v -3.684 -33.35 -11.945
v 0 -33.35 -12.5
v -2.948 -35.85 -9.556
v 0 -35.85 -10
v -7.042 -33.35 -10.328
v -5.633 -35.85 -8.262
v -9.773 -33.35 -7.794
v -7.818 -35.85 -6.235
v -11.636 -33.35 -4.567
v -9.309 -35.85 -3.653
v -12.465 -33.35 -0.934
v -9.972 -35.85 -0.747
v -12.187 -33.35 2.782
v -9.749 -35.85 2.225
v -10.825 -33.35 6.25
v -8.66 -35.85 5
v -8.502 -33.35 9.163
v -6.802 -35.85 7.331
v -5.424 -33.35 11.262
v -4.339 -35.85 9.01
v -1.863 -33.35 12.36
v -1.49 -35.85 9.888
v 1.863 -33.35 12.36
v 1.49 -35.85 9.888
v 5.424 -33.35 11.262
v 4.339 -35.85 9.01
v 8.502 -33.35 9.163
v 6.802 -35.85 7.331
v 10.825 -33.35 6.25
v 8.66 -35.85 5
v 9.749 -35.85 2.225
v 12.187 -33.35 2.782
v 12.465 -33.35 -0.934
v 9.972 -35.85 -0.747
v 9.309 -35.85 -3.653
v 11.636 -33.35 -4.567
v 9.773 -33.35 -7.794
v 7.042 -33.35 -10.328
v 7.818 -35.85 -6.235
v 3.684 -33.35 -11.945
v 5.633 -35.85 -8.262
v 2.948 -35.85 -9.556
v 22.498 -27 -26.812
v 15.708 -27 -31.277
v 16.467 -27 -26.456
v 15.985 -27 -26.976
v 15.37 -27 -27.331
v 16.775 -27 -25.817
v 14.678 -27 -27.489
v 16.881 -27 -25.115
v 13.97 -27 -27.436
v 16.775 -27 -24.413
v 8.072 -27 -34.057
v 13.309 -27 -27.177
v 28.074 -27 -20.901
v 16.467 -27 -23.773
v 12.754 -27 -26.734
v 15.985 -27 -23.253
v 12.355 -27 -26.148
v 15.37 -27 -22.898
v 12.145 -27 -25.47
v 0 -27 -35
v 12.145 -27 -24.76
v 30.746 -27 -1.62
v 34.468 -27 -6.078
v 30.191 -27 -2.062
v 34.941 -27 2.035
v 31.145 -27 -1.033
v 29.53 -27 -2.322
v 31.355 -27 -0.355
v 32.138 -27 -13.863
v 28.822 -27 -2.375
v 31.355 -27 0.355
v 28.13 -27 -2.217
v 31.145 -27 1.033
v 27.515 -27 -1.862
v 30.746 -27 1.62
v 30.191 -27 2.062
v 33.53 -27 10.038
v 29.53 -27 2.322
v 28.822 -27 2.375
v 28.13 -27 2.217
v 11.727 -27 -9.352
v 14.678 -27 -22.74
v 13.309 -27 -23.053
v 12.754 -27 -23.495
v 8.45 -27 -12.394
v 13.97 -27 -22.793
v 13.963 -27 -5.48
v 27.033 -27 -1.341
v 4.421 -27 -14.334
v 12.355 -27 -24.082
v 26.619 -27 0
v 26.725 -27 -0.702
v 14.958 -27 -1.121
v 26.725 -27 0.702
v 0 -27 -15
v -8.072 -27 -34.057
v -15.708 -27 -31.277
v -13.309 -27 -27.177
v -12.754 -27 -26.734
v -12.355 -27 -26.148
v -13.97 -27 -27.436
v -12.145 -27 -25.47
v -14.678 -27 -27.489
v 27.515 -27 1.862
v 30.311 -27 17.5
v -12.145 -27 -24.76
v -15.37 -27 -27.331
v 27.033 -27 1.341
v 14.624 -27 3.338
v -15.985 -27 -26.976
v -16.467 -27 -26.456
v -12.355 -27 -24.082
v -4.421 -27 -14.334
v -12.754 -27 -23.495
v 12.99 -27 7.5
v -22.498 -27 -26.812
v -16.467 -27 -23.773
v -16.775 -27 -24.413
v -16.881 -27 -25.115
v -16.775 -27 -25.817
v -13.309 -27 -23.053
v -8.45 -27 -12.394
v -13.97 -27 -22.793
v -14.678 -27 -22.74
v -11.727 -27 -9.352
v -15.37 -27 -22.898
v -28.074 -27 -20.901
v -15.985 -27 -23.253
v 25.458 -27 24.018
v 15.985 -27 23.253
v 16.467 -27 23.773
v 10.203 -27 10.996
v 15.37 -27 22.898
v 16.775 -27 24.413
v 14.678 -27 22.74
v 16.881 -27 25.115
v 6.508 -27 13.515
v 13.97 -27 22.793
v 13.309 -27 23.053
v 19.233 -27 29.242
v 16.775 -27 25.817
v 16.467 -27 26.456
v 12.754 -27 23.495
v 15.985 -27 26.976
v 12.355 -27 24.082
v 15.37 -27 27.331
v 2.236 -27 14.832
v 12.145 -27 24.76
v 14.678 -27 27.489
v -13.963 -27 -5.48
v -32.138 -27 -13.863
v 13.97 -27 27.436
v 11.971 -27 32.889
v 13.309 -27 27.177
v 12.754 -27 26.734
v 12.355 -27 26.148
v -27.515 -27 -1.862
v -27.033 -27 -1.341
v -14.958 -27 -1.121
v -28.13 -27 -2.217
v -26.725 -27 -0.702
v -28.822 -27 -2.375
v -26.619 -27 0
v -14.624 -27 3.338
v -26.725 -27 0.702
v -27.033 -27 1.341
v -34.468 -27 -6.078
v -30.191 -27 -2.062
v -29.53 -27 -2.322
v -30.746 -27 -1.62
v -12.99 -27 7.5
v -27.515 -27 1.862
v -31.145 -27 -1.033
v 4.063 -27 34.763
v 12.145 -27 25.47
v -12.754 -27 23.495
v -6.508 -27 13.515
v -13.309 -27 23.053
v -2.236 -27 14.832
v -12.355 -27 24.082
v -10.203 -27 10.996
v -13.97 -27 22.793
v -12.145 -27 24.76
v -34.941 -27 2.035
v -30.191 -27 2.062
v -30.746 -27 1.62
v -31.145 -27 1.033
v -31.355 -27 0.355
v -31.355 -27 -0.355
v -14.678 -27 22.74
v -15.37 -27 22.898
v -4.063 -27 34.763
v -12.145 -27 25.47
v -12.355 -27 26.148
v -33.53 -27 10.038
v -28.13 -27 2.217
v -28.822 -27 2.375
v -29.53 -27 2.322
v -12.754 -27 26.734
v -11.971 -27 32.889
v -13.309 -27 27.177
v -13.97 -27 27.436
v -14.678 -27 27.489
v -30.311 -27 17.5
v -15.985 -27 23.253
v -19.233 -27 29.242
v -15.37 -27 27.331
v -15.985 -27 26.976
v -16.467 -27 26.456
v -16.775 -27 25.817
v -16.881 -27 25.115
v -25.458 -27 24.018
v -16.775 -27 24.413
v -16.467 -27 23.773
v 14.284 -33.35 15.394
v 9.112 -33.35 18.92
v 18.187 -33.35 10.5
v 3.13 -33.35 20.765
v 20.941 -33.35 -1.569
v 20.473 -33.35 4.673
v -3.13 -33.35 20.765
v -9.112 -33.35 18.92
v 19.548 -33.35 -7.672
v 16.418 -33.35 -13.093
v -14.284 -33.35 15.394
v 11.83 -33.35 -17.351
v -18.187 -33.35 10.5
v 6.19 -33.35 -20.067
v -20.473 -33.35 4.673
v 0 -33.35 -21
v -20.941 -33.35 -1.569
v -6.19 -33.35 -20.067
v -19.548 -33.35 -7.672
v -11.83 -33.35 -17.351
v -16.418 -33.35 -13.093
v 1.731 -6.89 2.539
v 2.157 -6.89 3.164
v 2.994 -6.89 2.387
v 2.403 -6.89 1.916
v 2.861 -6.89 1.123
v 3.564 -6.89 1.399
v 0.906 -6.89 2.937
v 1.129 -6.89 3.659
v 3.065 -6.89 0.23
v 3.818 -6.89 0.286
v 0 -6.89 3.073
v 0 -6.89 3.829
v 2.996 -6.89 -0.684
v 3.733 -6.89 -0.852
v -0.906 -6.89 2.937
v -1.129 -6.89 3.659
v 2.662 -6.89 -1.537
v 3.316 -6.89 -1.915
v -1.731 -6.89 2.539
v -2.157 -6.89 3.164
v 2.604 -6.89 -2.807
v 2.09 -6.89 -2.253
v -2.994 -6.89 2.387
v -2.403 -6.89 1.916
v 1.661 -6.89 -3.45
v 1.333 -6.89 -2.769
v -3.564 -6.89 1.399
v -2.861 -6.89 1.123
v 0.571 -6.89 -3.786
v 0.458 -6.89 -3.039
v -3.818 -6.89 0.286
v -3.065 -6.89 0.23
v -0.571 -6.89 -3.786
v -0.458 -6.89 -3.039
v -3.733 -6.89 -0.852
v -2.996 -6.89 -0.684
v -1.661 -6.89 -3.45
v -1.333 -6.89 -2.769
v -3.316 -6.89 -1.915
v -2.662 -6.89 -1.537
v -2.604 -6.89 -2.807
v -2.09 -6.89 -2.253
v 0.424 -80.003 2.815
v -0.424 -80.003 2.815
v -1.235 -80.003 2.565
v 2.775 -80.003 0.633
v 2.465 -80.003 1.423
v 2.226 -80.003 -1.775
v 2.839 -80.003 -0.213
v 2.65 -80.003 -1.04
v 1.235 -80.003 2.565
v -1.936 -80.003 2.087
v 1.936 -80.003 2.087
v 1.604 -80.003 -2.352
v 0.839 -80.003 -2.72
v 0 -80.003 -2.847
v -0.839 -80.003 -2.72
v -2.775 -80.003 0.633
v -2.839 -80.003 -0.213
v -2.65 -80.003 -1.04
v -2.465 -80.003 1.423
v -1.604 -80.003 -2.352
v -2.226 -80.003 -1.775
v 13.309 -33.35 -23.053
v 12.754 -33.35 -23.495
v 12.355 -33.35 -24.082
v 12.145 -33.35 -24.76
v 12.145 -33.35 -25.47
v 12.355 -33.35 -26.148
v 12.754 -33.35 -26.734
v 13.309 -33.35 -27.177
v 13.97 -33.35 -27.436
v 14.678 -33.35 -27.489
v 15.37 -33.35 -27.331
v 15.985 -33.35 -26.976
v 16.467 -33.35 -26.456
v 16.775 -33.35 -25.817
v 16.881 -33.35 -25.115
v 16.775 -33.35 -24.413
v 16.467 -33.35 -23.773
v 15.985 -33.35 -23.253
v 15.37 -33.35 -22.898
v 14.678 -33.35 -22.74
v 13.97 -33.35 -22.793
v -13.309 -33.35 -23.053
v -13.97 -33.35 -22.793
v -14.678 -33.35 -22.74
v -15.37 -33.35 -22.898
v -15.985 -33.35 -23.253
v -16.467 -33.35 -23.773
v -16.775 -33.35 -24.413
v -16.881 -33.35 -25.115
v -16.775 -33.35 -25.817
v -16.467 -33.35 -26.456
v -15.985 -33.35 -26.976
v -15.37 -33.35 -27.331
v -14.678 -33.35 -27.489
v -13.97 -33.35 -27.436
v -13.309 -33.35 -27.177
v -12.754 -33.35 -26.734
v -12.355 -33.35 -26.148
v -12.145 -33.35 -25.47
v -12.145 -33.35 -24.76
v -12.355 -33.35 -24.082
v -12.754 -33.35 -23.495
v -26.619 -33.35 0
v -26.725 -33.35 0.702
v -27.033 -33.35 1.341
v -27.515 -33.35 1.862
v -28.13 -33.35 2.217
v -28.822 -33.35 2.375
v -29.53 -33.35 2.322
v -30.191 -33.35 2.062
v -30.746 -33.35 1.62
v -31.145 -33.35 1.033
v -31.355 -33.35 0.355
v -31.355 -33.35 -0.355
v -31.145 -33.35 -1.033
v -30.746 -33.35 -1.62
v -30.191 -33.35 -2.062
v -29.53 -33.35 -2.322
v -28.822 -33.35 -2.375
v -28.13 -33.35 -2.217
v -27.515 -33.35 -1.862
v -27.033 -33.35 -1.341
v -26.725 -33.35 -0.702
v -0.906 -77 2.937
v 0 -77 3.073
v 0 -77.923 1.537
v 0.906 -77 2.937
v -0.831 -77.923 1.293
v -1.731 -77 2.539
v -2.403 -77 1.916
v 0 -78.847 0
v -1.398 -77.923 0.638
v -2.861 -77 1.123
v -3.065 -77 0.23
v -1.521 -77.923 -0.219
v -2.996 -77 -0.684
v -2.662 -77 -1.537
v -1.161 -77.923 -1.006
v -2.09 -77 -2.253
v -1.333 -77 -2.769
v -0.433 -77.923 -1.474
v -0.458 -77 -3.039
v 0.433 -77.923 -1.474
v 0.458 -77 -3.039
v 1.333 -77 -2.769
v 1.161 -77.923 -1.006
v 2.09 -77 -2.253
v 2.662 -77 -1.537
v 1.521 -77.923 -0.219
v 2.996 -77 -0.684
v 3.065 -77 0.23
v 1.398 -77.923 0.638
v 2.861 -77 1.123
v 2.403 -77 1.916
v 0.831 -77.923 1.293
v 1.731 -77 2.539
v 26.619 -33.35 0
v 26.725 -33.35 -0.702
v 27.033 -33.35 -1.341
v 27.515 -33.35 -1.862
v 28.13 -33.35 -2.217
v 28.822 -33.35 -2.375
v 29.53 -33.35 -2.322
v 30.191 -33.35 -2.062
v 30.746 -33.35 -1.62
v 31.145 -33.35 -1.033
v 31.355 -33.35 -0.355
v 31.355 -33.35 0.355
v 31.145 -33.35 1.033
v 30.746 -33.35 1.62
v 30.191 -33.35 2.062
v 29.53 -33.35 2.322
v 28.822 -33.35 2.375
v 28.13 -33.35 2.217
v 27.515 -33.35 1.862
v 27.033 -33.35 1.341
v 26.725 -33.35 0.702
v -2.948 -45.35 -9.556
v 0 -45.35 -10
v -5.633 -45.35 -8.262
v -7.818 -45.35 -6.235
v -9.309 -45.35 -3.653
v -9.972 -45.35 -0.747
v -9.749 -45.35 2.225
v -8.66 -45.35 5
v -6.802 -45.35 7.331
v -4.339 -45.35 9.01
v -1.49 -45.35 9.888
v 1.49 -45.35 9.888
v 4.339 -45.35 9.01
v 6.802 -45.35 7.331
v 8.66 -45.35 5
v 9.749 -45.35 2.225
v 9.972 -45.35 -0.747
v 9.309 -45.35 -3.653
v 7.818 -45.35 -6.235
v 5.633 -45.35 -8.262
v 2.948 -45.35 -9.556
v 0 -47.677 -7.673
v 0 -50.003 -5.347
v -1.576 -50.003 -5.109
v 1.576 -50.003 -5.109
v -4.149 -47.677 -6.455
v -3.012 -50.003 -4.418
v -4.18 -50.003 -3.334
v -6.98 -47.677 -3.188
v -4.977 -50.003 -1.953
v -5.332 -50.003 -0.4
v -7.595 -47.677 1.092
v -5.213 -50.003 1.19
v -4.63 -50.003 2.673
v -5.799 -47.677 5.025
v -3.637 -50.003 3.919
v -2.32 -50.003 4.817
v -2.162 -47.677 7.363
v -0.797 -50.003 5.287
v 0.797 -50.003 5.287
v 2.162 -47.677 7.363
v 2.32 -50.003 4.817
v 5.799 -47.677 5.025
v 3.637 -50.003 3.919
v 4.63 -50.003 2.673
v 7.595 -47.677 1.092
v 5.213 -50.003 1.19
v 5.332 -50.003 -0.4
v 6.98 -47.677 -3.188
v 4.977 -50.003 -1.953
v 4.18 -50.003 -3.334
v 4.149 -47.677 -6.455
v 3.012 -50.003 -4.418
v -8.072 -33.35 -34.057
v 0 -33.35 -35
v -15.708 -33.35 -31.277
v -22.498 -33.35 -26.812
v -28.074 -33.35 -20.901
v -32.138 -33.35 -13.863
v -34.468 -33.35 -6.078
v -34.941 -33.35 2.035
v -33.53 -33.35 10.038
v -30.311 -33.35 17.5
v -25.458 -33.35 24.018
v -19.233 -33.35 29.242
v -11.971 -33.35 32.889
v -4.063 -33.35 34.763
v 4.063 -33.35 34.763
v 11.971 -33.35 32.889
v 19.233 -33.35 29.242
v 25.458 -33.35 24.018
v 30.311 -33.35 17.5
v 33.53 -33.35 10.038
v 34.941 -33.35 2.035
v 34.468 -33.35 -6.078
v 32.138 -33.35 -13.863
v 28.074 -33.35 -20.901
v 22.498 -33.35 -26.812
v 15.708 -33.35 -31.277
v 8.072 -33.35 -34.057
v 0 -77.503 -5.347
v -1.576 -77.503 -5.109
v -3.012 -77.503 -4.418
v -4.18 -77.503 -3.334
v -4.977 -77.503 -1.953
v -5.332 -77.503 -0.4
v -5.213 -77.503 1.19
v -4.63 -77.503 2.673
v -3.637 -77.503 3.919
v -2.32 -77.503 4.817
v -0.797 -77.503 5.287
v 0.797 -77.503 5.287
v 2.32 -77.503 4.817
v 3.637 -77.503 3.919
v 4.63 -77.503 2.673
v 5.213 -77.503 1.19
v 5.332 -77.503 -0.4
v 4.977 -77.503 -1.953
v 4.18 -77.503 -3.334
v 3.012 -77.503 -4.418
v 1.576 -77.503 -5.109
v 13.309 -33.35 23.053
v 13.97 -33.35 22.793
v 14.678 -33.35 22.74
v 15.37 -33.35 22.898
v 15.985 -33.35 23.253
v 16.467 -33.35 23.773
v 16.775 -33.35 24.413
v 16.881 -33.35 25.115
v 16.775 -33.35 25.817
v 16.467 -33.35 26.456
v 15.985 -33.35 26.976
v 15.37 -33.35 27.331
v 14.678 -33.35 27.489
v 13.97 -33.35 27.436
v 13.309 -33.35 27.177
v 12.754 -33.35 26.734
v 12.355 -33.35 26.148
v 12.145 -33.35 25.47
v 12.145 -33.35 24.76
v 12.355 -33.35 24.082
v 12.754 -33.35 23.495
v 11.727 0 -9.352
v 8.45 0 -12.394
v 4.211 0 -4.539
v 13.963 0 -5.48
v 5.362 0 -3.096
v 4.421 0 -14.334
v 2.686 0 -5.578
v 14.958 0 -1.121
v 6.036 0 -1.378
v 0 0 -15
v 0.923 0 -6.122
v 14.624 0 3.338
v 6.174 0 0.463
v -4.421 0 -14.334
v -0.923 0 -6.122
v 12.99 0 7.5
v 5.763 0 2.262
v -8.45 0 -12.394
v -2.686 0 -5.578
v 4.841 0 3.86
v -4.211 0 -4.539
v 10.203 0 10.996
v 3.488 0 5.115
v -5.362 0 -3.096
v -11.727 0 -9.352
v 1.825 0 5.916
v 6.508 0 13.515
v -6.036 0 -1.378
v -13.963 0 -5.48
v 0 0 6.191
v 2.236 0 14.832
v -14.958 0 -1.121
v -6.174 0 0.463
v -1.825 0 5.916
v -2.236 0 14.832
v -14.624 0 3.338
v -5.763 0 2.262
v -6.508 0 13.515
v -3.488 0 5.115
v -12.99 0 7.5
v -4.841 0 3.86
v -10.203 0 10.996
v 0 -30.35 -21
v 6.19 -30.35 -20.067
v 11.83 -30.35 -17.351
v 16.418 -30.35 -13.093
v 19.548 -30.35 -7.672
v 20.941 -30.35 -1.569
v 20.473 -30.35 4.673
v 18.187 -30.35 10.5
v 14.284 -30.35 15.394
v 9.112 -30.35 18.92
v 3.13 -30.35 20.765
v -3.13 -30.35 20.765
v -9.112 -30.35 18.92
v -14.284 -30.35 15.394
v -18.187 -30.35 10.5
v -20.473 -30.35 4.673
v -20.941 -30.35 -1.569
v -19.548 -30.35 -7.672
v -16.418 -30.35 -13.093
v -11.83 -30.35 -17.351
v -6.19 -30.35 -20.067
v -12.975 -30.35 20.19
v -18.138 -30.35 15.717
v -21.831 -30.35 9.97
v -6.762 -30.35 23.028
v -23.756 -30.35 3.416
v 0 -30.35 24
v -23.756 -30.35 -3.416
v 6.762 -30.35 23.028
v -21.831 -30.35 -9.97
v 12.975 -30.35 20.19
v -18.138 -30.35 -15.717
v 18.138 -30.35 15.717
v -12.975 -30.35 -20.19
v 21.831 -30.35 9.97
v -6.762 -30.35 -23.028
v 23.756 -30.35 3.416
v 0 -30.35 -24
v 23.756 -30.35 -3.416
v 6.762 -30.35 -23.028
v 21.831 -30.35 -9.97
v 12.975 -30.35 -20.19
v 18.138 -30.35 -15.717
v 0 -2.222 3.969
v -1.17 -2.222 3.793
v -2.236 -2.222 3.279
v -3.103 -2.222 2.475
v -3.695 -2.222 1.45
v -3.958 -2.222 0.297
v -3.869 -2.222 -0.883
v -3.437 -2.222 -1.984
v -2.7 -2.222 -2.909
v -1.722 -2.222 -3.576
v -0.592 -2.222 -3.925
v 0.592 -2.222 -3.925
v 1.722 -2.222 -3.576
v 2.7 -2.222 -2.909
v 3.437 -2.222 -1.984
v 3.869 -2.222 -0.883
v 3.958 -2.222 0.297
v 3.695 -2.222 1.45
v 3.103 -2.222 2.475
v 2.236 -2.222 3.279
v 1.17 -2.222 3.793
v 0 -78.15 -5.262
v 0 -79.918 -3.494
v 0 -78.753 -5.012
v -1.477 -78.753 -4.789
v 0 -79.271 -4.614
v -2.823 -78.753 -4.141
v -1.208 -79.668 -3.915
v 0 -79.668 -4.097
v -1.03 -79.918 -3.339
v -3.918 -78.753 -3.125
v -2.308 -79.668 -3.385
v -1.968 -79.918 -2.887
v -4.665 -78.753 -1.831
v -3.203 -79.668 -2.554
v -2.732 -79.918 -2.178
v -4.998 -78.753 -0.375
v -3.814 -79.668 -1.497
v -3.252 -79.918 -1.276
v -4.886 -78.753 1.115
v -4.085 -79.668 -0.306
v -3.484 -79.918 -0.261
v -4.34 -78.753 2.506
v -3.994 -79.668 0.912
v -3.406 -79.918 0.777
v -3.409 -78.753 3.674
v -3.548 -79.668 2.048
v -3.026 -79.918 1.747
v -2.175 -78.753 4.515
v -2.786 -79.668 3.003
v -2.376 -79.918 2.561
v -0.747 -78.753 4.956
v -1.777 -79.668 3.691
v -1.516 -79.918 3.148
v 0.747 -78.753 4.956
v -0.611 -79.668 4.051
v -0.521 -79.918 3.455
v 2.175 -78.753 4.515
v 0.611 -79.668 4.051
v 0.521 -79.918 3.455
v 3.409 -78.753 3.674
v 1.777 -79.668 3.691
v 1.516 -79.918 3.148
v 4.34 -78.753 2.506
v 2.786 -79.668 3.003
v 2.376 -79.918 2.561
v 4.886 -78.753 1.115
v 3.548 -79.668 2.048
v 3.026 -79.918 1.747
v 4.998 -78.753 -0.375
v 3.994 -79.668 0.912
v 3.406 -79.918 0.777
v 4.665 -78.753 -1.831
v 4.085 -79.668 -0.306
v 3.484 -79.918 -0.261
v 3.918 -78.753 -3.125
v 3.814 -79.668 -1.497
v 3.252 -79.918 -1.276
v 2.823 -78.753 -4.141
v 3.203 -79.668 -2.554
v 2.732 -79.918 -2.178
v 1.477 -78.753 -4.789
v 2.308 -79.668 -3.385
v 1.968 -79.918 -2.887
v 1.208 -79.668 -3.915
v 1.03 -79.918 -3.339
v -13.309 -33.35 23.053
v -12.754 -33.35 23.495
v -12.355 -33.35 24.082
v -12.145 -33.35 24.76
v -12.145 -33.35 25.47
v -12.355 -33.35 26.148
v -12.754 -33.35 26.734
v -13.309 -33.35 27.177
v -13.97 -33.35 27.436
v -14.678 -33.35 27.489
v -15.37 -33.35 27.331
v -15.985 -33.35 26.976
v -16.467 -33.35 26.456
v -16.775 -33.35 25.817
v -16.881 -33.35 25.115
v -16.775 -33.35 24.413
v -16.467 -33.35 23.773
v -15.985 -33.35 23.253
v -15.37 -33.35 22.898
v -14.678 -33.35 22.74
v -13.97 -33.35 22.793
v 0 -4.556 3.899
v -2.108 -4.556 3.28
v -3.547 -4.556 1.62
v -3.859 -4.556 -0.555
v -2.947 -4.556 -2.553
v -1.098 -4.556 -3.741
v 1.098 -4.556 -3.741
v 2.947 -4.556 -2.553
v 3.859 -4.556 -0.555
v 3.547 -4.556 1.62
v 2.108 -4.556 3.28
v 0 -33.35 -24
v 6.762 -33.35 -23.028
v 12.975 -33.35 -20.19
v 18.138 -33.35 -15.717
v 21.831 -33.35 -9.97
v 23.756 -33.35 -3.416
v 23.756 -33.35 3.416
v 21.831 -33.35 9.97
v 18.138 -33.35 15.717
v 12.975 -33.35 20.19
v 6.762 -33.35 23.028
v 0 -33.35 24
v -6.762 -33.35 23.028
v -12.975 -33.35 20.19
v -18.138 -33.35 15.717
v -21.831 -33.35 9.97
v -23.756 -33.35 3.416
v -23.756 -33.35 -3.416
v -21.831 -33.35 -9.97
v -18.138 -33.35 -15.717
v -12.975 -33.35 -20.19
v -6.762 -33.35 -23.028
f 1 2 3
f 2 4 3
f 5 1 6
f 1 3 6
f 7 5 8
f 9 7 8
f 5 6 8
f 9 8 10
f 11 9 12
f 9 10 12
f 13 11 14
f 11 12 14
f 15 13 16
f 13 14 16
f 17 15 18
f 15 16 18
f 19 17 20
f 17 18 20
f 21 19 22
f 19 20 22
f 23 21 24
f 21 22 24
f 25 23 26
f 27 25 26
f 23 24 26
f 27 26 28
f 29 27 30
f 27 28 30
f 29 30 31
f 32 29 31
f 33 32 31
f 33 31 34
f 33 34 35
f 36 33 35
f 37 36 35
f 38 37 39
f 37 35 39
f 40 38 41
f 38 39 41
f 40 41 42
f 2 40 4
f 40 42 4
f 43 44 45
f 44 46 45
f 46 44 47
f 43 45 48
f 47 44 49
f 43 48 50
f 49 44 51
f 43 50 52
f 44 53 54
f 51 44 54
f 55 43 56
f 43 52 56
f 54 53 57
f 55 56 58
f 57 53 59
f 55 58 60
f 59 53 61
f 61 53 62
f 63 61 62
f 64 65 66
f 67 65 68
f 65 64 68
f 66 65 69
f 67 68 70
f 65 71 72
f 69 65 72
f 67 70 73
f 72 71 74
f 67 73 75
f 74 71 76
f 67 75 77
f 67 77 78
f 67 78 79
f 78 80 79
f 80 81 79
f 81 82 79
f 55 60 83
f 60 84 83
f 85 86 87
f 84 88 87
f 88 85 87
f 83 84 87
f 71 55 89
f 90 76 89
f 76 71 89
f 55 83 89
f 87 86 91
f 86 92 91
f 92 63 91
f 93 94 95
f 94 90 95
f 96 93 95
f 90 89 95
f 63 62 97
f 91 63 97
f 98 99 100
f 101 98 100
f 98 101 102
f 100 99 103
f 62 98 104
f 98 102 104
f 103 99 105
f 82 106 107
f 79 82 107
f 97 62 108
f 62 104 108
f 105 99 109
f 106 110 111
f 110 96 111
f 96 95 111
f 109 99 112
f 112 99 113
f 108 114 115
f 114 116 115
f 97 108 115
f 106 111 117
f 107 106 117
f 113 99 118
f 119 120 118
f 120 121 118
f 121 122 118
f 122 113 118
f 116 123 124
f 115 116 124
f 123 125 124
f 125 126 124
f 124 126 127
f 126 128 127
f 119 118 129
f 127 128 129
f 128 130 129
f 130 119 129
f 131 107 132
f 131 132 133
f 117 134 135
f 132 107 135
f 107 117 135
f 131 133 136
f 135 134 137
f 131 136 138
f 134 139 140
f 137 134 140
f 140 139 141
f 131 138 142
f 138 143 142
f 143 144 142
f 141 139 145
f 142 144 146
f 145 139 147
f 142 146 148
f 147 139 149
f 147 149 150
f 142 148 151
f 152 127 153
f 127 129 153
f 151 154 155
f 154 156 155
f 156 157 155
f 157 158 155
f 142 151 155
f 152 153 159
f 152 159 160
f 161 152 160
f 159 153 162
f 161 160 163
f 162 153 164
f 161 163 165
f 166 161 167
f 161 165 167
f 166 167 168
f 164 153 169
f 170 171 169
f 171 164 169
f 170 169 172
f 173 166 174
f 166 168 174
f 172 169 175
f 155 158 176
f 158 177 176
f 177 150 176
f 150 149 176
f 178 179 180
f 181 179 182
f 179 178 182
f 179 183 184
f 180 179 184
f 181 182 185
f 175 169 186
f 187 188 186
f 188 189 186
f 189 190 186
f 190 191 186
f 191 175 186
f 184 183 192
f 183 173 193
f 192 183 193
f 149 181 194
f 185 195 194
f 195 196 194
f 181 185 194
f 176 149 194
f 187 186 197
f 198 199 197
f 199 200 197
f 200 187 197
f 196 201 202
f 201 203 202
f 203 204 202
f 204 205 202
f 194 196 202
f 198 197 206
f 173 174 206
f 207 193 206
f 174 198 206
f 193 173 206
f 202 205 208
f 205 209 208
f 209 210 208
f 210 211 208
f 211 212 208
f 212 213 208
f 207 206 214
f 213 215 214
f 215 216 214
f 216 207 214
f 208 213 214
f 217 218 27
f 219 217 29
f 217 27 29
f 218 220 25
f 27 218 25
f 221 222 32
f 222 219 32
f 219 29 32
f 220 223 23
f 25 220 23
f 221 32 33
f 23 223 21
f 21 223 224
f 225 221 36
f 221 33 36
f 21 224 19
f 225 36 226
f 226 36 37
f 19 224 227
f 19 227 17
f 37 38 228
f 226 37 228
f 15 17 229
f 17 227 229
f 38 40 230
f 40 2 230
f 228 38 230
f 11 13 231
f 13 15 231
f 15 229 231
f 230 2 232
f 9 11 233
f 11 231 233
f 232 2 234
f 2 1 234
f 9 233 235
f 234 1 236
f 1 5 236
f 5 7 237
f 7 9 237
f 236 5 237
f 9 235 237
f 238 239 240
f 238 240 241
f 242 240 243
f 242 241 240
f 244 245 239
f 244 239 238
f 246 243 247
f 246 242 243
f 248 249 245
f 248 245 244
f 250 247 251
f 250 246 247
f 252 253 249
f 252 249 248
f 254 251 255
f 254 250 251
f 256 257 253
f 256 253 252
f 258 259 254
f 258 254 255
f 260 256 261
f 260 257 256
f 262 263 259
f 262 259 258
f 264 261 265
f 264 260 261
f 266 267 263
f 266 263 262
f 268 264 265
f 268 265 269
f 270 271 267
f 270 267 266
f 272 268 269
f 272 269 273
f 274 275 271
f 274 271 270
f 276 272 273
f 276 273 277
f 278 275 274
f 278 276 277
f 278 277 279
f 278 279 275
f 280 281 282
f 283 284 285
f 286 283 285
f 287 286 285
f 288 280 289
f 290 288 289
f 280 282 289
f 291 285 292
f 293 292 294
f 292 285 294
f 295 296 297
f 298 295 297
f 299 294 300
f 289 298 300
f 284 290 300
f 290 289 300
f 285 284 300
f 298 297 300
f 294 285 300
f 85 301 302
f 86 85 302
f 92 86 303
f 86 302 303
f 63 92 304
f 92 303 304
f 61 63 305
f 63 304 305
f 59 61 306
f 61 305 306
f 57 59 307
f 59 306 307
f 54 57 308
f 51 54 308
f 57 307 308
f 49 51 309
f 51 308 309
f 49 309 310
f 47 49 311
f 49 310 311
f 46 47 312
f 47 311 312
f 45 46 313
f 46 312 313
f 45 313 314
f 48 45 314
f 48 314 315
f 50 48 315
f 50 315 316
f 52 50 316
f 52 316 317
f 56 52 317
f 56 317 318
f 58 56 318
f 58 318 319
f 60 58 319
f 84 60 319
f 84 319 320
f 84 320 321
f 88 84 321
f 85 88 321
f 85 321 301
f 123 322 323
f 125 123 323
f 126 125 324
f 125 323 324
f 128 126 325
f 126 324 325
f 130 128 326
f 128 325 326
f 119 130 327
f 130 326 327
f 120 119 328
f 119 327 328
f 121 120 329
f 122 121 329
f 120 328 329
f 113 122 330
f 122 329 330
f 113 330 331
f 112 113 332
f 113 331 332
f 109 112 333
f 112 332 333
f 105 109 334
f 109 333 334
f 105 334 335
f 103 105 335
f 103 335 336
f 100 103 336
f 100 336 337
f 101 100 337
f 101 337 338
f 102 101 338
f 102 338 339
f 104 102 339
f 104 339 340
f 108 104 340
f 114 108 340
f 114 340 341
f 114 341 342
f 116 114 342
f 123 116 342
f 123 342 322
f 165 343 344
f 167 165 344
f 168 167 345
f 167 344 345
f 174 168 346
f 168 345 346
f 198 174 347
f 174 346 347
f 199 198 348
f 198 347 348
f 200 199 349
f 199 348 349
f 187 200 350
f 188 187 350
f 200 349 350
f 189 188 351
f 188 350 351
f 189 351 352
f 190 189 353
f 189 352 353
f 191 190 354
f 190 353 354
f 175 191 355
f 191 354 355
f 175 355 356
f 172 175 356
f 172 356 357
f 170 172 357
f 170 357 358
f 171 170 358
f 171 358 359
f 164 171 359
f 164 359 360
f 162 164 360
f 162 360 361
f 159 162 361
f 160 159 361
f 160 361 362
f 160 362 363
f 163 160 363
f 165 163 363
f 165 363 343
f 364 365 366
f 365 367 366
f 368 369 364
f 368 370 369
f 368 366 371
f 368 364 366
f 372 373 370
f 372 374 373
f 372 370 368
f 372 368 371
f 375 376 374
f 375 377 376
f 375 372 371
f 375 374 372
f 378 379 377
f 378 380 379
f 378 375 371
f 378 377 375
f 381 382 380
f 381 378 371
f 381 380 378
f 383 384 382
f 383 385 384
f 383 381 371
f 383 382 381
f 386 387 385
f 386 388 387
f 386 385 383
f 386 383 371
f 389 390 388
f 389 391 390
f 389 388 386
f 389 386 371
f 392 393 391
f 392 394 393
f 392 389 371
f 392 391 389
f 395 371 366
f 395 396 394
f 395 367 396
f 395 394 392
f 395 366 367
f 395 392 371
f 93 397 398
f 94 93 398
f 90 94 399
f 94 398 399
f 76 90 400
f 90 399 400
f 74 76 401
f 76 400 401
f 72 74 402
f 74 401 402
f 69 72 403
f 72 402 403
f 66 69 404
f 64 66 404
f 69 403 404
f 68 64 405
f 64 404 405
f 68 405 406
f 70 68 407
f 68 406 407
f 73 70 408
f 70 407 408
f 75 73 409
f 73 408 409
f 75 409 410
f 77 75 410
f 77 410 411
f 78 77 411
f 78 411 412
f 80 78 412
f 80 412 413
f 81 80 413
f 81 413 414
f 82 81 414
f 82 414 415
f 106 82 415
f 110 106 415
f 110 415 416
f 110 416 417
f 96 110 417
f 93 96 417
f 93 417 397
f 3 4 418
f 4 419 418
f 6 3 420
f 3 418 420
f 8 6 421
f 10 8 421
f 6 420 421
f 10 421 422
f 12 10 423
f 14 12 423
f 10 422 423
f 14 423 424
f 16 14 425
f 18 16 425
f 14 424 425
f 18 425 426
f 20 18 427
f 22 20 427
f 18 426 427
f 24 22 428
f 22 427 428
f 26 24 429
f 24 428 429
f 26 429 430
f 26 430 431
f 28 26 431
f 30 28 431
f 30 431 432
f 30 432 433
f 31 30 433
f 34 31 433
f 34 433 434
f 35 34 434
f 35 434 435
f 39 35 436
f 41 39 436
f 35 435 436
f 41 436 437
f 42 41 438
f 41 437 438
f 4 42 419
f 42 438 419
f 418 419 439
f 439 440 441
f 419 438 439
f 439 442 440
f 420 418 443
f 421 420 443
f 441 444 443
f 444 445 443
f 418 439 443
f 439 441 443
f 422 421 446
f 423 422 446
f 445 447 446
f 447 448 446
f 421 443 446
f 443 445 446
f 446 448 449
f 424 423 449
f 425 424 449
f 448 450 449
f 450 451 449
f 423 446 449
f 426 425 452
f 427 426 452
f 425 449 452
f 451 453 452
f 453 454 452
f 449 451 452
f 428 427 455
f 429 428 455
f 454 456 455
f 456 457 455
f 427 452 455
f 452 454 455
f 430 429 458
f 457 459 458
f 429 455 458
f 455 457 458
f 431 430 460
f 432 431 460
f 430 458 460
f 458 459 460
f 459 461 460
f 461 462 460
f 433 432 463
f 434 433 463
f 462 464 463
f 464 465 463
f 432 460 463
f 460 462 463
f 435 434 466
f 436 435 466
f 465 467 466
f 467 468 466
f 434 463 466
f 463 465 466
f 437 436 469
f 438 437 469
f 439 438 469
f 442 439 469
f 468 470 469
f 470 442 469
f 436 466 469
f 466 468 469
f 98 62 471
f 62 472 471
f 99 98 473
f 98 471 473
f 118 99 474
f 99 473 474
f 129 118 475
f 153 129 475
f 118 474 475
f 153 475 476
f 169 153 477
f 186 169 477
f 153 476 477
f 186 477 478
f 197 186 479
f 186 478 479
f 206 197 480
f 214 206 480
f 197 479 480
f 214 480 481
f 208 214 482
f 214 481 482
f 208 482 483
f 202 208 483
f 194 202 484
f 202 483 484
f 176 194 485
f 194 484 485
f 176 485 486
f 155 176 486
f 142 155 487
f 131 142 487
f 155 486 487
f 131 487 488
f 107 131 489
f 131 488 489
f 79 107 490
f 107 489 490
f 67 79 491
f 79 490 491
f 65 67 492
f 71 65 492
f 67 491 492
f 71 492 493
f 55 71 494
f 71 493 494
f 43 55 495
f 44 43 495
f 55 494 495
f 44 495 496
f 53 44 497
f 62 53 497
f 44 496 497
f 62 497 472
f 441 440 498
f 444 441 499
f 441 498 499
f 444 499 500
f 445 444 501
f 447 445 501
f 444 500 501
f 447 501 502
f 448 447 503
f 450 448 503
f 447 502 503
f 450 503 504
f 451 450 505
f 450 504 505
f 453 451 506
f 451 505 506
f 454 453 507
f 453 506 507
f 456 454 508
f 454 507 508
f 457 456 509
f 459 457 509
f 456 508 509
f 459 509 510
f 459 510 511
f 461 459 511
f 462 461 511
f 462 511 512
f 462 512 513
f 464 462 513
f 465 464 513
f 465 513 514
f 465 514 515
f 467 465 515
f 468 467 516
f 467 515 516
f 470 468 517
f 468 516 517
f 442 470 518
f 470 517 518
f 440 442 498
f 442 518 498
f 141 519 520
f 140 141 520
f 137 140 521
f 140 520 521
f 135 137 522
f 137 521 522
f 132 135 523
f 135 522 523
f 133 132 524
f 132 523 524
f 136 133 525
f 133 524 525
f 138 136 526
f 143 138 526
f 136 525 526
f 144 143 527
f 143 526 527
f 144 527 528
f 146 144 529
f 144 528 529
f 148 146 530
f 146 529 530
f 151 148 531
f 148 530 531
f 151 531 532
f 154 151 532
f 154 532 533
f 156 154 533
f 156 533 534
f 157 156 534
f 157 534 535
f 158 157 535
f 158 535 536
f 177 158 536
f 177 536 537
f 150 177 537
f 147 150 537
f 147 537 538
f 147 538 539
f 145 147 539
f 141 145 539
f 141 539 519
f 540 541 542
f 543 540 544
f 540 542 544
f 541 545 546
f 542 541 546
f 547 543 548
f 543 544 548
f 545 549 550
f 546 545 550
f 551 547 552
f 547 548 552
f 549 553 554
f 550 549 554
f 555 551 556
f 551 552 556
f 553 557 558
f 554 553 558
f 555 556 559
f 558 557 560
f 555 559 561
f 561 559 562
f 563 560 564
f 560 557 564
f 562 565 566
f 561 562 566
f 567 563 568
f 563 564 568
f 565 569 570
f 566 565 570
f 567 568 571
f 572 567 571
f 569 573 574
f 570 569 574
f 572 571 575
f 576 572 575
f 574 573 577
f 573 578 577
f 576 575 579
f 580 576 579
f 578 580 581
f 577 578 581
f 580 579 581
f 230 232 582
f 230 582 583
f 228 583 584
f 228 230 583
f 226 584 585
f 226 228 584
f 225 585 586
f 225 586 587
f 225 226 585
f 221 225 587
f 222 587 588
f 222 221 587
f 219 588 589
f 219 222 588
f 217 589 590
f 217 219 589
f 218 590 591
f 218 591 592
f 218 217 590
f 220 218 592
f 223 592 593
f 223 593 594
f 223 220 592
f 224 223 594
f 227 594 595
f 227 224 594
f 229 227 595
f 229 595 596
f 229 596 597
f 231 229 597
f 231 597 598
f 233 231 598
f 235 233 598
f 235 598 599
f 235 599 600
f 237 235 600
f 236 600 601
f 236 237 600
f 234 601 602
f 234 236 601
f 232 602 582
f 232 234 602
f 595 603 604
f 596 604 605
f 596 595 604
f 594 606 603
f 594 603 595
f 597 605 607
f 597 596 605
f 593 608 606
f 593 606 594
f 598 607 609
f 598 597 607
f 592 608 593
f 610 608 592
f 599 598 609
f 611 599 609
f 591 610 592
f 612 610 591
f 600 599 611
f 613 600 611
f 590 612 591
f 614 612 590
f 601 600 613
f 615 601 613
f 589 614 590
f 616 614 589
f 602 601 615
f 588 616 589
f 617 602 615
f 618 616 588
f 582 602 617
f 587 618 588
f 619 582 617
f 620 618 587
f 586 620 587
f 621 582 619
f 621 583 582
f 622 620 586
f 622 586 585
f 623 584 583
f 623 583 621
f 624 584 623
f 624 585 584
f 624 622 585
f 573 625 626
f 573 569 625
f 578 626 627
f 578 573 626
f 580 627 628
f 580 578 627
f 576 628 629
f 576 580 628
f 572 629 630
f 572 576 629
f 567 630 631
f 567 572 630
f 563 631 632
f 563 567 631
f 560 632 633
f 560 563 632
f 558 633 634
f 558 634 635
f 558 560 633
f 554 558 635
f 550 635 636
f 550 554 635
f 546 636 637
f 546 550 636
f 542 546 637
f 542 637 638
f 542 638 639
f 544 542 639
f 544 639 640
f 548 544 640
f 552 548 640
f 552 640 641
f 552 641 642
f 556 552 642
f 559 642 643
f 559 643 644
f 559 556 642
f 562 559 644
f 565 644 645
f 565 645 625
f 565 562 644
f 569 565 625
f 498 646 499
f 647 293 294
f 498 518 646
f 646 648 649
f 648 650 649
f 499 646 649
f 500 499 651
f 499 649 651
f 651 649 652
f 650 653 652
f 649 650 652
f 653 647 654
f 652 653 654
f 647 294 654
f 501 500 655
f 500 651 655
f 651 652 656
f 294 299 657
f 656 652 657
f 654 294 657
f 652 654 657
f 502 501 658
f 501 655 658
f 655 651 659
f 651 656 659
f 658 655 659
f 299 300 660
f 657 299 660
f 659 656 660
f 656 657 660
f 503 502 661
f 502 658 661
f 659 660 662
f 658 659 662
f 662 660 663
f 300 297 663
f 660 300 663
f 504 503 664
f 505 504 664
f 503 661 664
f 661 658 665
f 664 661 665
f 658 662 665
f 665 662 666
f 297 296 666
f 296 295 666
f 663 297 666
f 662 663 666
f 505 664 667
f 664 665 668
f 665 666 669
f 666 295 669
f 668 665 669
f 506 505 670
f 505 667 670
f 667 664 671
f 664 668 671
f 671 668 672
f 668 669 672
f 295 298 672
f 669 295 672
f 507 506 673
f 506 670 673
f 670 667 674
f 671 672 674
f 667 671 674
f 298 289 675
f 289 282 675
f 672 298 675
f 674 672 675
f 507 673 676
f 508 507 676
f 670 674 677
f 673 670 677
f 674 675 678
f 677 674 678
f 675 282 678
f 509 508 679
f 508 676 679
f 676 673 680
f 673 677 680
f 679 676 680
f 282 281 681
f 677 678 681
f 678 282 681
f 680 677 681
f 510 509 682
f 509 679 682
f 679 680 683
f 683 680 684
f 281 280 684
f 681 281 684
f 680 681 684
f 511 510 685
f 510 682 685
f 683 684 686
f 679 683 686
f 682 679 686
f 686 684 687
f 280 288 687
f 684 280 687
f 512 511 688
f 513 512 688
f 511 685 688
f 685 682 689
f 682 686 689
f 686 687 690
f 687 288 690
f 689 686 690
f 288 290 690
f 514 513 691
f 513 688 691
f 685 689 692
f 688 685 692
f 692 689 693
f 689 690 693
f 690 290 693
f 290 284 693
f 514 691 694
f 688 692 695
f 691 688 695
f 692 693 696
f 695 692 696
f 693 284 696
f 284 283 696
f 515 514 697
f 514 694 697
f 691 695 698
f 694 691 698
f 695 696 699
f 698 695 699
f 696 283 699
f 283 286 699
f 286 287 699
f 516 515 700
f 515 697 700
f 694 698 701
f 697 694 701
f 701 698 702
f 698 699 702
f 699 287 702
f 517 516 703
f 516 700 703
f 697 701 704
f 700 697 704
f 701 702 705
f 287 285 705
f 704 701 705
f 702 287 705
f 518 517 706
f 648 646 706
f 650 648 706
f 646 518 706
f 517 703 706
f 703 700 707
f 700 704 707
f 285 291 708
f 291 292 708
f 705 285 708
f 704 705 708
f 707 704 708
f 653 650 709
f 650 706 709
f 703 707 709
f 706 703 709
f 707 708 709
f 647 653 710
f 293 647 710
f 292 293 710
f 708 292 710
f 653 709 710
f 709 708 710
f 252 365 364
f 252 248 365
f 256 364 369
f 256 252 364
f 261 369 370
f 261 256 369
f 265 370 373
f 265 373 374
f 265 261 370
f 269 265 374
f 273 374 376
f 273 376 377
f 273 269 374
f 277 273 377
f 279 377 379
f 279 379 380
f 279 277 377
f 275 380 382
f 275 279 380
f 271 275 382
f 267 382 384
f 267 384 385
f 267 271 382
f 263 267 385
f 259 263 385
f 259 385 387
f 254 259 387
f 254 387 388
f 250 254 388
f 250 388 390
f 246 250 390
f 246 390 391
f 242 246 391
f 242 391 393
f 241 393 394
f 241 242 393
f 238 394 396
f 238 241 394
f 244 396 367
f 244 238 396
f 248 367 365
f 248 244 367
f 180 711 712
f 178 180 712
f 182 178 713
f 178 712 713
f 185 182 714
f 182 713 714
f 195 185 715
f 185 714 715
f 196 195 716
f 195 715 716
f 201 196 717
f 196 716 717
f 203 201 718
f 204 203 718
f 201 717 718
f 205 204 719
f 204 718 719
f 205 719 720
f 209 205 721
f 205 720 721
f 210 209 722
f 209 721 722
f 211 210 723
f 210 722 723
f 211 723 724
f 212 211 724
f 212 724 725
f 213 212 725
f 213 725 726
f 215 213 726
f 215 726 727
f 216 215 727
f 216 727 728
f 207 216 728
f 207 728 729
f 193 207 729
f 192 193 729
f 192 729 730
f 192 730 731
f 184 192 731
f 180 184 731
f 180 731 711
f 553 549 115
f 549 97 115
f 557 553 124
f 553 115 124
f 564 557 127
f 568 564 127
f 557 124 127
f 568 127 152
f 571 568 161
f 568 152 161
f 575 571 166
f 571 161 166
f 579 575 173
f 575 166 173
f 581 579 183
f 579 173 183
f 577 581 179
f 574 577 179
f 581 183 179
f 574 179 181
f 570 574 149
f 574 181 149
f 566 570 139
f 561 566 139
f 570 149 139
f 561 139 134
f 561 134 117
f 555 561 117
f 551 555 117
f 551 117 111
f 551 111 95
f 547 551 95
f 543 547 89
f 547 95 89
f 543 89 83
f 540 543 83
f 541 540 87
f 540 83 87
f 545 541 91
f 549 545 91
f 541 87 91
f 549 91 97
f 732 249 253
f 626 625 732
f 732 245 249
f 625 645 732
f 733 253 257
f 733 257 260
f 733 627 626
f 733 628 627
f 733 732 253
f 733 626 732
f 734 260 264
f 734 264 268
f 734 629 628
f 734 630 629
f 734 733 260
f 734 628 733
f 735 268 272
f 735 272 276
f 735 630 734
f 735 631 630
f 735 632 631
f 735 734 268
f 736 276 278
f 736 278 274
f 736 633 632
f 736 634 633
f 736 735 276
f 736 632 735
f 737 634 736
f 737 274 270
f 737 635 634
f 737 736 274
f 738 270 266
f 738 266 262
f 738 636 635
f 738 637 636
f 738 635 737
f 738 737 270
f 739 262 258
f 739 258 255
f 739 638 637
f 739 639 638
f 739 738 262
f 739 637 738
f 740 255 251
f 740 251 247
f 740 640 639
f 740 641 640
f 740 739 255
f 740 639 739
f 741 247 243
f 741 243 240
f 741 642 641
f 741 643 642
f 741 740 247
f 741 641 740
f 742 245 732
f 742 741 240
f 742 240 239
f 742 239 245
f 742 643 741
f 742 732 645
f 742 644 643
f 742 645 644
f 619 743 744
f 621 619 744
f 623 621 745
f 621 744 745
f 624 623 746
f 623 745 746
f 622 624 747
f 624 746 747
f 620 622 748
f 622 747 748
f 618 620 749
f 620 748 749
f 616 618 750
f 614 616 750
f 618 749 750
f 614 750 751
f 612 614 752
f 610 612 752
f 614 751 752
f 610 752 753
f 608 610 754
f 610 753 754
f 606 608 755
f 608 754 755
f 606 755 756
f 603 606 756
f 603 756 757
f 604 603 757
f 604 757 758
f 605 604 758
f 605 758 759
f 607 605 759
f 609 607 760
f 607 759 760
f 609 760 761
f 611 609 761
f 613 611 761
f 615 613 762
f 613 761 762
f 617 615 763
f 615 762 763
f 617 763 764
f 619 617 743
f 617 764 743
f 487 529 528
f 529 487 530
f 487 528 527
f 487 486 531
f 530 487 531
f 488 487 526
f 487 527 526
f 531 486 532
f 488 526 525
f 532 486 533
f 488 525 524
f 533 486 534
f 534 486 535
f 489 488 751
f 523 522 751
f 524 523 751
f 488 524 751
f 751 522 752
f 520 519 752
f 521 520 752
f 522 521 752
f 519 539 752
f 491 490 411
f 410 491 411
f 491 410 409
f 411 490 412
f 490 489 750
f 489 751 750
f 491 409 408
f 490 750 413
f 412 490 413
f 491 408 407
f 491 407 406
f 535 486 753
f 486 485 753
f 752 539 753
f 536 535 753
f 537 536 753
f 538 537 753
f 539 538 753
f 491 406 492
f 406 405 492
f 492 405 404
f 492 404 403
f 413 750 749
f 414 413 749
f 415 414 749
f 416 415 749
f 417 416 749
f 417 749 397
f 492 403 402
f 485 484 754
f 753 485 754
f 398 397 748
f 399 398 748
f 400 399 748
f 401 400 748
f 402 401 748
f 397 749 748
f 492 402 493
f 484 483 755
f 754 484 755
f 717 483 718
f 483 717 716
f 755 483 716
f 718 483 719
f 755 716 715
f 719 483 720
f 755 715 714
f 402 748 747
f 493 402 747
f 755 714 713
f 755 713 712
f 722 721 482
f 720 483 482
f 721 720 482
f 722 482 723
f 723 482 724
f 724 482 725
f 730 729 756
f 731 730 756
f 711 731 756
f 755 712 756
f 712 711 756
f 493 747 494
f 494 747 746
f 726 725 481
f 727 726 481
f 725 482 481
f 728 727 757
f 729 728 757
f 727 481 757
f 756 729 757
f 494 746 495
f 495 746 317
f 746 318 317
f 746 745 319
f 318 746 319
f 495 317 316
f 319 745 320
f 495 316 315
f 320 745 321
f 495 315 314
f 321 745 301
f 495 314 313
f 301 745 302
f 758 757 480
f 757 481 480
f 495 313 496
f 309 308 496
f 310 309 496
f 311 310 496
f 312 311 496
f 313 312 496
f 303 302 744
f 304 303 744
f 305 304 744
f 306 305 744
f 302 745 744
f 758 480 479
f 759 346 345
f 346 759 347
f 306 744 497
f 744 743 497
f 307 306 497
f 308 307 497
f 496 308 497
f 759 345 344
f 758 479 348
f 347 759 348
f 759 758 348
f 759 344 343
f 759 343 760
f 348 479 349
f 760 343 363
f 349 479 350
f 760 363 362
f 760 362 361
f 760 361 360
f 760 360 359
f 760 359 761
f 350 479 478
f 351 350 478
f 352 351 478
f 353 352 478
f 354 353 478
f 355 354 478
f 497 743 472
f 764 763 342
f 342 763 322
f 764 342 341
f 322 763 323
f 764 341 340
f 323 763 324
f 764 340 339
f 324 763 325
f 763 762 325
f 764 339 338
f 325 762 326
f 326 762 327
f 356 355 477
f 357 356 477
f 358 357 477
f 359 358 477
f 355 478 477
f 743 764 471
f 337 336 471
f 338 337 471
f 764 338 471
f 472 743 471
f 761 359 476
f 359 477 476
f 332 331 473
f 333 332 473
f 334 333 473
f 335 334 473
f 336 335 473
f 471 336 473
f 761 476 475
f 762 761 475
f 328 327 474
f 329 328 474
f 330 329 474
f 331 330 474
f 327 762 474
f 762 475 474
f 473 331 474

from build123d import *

# Parameters (mm, degrees)
SKETCH5_R                      = 24
SKETCH5_R_2                    = 21
CUT_EXTRUDE1_DEPTH             = 3
F_3_16_0_1875_DIAMETER_HOLE1_D = 4.7625
CIRPATTERN1_COUNT              = 6


with BuildPart() as part:
    # Sketch1 → Revolve1 (revolve)
    with BuildSketch(Plane.XY, mode=Mode.PRIVATE) as revolve1_sk:
        with BuildLine():
            Line((0, 0), (-15, 0))
            Line((-15, 0), (-15, -27))
            Line((-15, -27), (-35, -27))
            Line((-35, -27), (-35, -33.35))
            Line((-35, -33.35), (-12.5, -33.35))
            Line((-12.5, -33.35), (-10, -35.85))
            Line((-10, -35.85), (-10, -45.35))
            Line((-10, -45.35), (-5.3467, -50.0033))
            Line((-5.3467, -50.0033), (-5.3467, -77.5033))
            ThreePointArc((-5.3467, -77.5033), (-4.614466953, -79.271066953), (-2.8467, -80.0033))
            Line((-2.8467, -80.0033), (0, -80.0033))
            Line((0, -80.0033), (0, 0))
        make_face()
    revolve(revolve1_sk.sketch.rotate(Axis((0, -80.0033, 0), (0, 1, 0)), 270), axis=Axis((0, -80.0033, 0), (0, 1, 0)))

    # Sketch4 → 1/16 NPT Tapped Hole1 (revolve, cut)
    with BuildSketch(Plane(origin=(0, 0, 0), x_dir=(0, 0, 1), z_dir=(1, 0, 0))):
        Polygon((0, 0), (0, 78.846685027), (3.0734, 77), (3.0734, 6.89), (3.829121997, 6.89), (3.968877, 2.222373), (6.19125, 0), align=None)
    revolve(axis=Axis((0, 6.35, 0), (0, -1, 0)), mode=Mode.SUBTRACT)

    # Sketch5 → Cut-Extrude1 (cut)
    with BuildSketch(Plane(origin=(0, -33.35, 0), x_dir=(-1, 0, 0), z_dir=(0, -1, 0))):
        with Locations(Location((0, 0, 0), (0, 0, 90))):
            Circle(SKETCH5_R)
        with Locations(Location((0, 0, 0), (0, 0, 90))):
            Circle(SKETCH5_R_2, mode=Mode.SUBTRACT)
    extrude(amount=-CUT_EXTRUDE1_DEPTH, mode=Mode.SUBTRACT)

    # 3/16 (0.1875) Diameter Hole1 (through all)
    with Locations(Plane(origin=(0, -27, 0), x_dir=(1, 0, 0), z_dir=(0, 1, 0))):
        with Locations((29, 0)):
            f_3_16_0_1875_diameter_hole1 = Hole(F_3_16_0_1875_DIAMETER_HOLE1_D / 2)

    # CirPattern1: 3/16 (0.1875) Diameter Hole1 ×6 about axis
    cirpattern1_axis = Axis((0, 0, 0), (0, 1, 0))
    for i in range(1, CIRPATTERN1_COUNT):
        add(f_3_16_0_1875_diameter_hole1.rotate(cirpattern1_axis, i * 360 / CIRPATTERN1_COUNT), mode=Mode.SUBTRACT)


solid = part.part
